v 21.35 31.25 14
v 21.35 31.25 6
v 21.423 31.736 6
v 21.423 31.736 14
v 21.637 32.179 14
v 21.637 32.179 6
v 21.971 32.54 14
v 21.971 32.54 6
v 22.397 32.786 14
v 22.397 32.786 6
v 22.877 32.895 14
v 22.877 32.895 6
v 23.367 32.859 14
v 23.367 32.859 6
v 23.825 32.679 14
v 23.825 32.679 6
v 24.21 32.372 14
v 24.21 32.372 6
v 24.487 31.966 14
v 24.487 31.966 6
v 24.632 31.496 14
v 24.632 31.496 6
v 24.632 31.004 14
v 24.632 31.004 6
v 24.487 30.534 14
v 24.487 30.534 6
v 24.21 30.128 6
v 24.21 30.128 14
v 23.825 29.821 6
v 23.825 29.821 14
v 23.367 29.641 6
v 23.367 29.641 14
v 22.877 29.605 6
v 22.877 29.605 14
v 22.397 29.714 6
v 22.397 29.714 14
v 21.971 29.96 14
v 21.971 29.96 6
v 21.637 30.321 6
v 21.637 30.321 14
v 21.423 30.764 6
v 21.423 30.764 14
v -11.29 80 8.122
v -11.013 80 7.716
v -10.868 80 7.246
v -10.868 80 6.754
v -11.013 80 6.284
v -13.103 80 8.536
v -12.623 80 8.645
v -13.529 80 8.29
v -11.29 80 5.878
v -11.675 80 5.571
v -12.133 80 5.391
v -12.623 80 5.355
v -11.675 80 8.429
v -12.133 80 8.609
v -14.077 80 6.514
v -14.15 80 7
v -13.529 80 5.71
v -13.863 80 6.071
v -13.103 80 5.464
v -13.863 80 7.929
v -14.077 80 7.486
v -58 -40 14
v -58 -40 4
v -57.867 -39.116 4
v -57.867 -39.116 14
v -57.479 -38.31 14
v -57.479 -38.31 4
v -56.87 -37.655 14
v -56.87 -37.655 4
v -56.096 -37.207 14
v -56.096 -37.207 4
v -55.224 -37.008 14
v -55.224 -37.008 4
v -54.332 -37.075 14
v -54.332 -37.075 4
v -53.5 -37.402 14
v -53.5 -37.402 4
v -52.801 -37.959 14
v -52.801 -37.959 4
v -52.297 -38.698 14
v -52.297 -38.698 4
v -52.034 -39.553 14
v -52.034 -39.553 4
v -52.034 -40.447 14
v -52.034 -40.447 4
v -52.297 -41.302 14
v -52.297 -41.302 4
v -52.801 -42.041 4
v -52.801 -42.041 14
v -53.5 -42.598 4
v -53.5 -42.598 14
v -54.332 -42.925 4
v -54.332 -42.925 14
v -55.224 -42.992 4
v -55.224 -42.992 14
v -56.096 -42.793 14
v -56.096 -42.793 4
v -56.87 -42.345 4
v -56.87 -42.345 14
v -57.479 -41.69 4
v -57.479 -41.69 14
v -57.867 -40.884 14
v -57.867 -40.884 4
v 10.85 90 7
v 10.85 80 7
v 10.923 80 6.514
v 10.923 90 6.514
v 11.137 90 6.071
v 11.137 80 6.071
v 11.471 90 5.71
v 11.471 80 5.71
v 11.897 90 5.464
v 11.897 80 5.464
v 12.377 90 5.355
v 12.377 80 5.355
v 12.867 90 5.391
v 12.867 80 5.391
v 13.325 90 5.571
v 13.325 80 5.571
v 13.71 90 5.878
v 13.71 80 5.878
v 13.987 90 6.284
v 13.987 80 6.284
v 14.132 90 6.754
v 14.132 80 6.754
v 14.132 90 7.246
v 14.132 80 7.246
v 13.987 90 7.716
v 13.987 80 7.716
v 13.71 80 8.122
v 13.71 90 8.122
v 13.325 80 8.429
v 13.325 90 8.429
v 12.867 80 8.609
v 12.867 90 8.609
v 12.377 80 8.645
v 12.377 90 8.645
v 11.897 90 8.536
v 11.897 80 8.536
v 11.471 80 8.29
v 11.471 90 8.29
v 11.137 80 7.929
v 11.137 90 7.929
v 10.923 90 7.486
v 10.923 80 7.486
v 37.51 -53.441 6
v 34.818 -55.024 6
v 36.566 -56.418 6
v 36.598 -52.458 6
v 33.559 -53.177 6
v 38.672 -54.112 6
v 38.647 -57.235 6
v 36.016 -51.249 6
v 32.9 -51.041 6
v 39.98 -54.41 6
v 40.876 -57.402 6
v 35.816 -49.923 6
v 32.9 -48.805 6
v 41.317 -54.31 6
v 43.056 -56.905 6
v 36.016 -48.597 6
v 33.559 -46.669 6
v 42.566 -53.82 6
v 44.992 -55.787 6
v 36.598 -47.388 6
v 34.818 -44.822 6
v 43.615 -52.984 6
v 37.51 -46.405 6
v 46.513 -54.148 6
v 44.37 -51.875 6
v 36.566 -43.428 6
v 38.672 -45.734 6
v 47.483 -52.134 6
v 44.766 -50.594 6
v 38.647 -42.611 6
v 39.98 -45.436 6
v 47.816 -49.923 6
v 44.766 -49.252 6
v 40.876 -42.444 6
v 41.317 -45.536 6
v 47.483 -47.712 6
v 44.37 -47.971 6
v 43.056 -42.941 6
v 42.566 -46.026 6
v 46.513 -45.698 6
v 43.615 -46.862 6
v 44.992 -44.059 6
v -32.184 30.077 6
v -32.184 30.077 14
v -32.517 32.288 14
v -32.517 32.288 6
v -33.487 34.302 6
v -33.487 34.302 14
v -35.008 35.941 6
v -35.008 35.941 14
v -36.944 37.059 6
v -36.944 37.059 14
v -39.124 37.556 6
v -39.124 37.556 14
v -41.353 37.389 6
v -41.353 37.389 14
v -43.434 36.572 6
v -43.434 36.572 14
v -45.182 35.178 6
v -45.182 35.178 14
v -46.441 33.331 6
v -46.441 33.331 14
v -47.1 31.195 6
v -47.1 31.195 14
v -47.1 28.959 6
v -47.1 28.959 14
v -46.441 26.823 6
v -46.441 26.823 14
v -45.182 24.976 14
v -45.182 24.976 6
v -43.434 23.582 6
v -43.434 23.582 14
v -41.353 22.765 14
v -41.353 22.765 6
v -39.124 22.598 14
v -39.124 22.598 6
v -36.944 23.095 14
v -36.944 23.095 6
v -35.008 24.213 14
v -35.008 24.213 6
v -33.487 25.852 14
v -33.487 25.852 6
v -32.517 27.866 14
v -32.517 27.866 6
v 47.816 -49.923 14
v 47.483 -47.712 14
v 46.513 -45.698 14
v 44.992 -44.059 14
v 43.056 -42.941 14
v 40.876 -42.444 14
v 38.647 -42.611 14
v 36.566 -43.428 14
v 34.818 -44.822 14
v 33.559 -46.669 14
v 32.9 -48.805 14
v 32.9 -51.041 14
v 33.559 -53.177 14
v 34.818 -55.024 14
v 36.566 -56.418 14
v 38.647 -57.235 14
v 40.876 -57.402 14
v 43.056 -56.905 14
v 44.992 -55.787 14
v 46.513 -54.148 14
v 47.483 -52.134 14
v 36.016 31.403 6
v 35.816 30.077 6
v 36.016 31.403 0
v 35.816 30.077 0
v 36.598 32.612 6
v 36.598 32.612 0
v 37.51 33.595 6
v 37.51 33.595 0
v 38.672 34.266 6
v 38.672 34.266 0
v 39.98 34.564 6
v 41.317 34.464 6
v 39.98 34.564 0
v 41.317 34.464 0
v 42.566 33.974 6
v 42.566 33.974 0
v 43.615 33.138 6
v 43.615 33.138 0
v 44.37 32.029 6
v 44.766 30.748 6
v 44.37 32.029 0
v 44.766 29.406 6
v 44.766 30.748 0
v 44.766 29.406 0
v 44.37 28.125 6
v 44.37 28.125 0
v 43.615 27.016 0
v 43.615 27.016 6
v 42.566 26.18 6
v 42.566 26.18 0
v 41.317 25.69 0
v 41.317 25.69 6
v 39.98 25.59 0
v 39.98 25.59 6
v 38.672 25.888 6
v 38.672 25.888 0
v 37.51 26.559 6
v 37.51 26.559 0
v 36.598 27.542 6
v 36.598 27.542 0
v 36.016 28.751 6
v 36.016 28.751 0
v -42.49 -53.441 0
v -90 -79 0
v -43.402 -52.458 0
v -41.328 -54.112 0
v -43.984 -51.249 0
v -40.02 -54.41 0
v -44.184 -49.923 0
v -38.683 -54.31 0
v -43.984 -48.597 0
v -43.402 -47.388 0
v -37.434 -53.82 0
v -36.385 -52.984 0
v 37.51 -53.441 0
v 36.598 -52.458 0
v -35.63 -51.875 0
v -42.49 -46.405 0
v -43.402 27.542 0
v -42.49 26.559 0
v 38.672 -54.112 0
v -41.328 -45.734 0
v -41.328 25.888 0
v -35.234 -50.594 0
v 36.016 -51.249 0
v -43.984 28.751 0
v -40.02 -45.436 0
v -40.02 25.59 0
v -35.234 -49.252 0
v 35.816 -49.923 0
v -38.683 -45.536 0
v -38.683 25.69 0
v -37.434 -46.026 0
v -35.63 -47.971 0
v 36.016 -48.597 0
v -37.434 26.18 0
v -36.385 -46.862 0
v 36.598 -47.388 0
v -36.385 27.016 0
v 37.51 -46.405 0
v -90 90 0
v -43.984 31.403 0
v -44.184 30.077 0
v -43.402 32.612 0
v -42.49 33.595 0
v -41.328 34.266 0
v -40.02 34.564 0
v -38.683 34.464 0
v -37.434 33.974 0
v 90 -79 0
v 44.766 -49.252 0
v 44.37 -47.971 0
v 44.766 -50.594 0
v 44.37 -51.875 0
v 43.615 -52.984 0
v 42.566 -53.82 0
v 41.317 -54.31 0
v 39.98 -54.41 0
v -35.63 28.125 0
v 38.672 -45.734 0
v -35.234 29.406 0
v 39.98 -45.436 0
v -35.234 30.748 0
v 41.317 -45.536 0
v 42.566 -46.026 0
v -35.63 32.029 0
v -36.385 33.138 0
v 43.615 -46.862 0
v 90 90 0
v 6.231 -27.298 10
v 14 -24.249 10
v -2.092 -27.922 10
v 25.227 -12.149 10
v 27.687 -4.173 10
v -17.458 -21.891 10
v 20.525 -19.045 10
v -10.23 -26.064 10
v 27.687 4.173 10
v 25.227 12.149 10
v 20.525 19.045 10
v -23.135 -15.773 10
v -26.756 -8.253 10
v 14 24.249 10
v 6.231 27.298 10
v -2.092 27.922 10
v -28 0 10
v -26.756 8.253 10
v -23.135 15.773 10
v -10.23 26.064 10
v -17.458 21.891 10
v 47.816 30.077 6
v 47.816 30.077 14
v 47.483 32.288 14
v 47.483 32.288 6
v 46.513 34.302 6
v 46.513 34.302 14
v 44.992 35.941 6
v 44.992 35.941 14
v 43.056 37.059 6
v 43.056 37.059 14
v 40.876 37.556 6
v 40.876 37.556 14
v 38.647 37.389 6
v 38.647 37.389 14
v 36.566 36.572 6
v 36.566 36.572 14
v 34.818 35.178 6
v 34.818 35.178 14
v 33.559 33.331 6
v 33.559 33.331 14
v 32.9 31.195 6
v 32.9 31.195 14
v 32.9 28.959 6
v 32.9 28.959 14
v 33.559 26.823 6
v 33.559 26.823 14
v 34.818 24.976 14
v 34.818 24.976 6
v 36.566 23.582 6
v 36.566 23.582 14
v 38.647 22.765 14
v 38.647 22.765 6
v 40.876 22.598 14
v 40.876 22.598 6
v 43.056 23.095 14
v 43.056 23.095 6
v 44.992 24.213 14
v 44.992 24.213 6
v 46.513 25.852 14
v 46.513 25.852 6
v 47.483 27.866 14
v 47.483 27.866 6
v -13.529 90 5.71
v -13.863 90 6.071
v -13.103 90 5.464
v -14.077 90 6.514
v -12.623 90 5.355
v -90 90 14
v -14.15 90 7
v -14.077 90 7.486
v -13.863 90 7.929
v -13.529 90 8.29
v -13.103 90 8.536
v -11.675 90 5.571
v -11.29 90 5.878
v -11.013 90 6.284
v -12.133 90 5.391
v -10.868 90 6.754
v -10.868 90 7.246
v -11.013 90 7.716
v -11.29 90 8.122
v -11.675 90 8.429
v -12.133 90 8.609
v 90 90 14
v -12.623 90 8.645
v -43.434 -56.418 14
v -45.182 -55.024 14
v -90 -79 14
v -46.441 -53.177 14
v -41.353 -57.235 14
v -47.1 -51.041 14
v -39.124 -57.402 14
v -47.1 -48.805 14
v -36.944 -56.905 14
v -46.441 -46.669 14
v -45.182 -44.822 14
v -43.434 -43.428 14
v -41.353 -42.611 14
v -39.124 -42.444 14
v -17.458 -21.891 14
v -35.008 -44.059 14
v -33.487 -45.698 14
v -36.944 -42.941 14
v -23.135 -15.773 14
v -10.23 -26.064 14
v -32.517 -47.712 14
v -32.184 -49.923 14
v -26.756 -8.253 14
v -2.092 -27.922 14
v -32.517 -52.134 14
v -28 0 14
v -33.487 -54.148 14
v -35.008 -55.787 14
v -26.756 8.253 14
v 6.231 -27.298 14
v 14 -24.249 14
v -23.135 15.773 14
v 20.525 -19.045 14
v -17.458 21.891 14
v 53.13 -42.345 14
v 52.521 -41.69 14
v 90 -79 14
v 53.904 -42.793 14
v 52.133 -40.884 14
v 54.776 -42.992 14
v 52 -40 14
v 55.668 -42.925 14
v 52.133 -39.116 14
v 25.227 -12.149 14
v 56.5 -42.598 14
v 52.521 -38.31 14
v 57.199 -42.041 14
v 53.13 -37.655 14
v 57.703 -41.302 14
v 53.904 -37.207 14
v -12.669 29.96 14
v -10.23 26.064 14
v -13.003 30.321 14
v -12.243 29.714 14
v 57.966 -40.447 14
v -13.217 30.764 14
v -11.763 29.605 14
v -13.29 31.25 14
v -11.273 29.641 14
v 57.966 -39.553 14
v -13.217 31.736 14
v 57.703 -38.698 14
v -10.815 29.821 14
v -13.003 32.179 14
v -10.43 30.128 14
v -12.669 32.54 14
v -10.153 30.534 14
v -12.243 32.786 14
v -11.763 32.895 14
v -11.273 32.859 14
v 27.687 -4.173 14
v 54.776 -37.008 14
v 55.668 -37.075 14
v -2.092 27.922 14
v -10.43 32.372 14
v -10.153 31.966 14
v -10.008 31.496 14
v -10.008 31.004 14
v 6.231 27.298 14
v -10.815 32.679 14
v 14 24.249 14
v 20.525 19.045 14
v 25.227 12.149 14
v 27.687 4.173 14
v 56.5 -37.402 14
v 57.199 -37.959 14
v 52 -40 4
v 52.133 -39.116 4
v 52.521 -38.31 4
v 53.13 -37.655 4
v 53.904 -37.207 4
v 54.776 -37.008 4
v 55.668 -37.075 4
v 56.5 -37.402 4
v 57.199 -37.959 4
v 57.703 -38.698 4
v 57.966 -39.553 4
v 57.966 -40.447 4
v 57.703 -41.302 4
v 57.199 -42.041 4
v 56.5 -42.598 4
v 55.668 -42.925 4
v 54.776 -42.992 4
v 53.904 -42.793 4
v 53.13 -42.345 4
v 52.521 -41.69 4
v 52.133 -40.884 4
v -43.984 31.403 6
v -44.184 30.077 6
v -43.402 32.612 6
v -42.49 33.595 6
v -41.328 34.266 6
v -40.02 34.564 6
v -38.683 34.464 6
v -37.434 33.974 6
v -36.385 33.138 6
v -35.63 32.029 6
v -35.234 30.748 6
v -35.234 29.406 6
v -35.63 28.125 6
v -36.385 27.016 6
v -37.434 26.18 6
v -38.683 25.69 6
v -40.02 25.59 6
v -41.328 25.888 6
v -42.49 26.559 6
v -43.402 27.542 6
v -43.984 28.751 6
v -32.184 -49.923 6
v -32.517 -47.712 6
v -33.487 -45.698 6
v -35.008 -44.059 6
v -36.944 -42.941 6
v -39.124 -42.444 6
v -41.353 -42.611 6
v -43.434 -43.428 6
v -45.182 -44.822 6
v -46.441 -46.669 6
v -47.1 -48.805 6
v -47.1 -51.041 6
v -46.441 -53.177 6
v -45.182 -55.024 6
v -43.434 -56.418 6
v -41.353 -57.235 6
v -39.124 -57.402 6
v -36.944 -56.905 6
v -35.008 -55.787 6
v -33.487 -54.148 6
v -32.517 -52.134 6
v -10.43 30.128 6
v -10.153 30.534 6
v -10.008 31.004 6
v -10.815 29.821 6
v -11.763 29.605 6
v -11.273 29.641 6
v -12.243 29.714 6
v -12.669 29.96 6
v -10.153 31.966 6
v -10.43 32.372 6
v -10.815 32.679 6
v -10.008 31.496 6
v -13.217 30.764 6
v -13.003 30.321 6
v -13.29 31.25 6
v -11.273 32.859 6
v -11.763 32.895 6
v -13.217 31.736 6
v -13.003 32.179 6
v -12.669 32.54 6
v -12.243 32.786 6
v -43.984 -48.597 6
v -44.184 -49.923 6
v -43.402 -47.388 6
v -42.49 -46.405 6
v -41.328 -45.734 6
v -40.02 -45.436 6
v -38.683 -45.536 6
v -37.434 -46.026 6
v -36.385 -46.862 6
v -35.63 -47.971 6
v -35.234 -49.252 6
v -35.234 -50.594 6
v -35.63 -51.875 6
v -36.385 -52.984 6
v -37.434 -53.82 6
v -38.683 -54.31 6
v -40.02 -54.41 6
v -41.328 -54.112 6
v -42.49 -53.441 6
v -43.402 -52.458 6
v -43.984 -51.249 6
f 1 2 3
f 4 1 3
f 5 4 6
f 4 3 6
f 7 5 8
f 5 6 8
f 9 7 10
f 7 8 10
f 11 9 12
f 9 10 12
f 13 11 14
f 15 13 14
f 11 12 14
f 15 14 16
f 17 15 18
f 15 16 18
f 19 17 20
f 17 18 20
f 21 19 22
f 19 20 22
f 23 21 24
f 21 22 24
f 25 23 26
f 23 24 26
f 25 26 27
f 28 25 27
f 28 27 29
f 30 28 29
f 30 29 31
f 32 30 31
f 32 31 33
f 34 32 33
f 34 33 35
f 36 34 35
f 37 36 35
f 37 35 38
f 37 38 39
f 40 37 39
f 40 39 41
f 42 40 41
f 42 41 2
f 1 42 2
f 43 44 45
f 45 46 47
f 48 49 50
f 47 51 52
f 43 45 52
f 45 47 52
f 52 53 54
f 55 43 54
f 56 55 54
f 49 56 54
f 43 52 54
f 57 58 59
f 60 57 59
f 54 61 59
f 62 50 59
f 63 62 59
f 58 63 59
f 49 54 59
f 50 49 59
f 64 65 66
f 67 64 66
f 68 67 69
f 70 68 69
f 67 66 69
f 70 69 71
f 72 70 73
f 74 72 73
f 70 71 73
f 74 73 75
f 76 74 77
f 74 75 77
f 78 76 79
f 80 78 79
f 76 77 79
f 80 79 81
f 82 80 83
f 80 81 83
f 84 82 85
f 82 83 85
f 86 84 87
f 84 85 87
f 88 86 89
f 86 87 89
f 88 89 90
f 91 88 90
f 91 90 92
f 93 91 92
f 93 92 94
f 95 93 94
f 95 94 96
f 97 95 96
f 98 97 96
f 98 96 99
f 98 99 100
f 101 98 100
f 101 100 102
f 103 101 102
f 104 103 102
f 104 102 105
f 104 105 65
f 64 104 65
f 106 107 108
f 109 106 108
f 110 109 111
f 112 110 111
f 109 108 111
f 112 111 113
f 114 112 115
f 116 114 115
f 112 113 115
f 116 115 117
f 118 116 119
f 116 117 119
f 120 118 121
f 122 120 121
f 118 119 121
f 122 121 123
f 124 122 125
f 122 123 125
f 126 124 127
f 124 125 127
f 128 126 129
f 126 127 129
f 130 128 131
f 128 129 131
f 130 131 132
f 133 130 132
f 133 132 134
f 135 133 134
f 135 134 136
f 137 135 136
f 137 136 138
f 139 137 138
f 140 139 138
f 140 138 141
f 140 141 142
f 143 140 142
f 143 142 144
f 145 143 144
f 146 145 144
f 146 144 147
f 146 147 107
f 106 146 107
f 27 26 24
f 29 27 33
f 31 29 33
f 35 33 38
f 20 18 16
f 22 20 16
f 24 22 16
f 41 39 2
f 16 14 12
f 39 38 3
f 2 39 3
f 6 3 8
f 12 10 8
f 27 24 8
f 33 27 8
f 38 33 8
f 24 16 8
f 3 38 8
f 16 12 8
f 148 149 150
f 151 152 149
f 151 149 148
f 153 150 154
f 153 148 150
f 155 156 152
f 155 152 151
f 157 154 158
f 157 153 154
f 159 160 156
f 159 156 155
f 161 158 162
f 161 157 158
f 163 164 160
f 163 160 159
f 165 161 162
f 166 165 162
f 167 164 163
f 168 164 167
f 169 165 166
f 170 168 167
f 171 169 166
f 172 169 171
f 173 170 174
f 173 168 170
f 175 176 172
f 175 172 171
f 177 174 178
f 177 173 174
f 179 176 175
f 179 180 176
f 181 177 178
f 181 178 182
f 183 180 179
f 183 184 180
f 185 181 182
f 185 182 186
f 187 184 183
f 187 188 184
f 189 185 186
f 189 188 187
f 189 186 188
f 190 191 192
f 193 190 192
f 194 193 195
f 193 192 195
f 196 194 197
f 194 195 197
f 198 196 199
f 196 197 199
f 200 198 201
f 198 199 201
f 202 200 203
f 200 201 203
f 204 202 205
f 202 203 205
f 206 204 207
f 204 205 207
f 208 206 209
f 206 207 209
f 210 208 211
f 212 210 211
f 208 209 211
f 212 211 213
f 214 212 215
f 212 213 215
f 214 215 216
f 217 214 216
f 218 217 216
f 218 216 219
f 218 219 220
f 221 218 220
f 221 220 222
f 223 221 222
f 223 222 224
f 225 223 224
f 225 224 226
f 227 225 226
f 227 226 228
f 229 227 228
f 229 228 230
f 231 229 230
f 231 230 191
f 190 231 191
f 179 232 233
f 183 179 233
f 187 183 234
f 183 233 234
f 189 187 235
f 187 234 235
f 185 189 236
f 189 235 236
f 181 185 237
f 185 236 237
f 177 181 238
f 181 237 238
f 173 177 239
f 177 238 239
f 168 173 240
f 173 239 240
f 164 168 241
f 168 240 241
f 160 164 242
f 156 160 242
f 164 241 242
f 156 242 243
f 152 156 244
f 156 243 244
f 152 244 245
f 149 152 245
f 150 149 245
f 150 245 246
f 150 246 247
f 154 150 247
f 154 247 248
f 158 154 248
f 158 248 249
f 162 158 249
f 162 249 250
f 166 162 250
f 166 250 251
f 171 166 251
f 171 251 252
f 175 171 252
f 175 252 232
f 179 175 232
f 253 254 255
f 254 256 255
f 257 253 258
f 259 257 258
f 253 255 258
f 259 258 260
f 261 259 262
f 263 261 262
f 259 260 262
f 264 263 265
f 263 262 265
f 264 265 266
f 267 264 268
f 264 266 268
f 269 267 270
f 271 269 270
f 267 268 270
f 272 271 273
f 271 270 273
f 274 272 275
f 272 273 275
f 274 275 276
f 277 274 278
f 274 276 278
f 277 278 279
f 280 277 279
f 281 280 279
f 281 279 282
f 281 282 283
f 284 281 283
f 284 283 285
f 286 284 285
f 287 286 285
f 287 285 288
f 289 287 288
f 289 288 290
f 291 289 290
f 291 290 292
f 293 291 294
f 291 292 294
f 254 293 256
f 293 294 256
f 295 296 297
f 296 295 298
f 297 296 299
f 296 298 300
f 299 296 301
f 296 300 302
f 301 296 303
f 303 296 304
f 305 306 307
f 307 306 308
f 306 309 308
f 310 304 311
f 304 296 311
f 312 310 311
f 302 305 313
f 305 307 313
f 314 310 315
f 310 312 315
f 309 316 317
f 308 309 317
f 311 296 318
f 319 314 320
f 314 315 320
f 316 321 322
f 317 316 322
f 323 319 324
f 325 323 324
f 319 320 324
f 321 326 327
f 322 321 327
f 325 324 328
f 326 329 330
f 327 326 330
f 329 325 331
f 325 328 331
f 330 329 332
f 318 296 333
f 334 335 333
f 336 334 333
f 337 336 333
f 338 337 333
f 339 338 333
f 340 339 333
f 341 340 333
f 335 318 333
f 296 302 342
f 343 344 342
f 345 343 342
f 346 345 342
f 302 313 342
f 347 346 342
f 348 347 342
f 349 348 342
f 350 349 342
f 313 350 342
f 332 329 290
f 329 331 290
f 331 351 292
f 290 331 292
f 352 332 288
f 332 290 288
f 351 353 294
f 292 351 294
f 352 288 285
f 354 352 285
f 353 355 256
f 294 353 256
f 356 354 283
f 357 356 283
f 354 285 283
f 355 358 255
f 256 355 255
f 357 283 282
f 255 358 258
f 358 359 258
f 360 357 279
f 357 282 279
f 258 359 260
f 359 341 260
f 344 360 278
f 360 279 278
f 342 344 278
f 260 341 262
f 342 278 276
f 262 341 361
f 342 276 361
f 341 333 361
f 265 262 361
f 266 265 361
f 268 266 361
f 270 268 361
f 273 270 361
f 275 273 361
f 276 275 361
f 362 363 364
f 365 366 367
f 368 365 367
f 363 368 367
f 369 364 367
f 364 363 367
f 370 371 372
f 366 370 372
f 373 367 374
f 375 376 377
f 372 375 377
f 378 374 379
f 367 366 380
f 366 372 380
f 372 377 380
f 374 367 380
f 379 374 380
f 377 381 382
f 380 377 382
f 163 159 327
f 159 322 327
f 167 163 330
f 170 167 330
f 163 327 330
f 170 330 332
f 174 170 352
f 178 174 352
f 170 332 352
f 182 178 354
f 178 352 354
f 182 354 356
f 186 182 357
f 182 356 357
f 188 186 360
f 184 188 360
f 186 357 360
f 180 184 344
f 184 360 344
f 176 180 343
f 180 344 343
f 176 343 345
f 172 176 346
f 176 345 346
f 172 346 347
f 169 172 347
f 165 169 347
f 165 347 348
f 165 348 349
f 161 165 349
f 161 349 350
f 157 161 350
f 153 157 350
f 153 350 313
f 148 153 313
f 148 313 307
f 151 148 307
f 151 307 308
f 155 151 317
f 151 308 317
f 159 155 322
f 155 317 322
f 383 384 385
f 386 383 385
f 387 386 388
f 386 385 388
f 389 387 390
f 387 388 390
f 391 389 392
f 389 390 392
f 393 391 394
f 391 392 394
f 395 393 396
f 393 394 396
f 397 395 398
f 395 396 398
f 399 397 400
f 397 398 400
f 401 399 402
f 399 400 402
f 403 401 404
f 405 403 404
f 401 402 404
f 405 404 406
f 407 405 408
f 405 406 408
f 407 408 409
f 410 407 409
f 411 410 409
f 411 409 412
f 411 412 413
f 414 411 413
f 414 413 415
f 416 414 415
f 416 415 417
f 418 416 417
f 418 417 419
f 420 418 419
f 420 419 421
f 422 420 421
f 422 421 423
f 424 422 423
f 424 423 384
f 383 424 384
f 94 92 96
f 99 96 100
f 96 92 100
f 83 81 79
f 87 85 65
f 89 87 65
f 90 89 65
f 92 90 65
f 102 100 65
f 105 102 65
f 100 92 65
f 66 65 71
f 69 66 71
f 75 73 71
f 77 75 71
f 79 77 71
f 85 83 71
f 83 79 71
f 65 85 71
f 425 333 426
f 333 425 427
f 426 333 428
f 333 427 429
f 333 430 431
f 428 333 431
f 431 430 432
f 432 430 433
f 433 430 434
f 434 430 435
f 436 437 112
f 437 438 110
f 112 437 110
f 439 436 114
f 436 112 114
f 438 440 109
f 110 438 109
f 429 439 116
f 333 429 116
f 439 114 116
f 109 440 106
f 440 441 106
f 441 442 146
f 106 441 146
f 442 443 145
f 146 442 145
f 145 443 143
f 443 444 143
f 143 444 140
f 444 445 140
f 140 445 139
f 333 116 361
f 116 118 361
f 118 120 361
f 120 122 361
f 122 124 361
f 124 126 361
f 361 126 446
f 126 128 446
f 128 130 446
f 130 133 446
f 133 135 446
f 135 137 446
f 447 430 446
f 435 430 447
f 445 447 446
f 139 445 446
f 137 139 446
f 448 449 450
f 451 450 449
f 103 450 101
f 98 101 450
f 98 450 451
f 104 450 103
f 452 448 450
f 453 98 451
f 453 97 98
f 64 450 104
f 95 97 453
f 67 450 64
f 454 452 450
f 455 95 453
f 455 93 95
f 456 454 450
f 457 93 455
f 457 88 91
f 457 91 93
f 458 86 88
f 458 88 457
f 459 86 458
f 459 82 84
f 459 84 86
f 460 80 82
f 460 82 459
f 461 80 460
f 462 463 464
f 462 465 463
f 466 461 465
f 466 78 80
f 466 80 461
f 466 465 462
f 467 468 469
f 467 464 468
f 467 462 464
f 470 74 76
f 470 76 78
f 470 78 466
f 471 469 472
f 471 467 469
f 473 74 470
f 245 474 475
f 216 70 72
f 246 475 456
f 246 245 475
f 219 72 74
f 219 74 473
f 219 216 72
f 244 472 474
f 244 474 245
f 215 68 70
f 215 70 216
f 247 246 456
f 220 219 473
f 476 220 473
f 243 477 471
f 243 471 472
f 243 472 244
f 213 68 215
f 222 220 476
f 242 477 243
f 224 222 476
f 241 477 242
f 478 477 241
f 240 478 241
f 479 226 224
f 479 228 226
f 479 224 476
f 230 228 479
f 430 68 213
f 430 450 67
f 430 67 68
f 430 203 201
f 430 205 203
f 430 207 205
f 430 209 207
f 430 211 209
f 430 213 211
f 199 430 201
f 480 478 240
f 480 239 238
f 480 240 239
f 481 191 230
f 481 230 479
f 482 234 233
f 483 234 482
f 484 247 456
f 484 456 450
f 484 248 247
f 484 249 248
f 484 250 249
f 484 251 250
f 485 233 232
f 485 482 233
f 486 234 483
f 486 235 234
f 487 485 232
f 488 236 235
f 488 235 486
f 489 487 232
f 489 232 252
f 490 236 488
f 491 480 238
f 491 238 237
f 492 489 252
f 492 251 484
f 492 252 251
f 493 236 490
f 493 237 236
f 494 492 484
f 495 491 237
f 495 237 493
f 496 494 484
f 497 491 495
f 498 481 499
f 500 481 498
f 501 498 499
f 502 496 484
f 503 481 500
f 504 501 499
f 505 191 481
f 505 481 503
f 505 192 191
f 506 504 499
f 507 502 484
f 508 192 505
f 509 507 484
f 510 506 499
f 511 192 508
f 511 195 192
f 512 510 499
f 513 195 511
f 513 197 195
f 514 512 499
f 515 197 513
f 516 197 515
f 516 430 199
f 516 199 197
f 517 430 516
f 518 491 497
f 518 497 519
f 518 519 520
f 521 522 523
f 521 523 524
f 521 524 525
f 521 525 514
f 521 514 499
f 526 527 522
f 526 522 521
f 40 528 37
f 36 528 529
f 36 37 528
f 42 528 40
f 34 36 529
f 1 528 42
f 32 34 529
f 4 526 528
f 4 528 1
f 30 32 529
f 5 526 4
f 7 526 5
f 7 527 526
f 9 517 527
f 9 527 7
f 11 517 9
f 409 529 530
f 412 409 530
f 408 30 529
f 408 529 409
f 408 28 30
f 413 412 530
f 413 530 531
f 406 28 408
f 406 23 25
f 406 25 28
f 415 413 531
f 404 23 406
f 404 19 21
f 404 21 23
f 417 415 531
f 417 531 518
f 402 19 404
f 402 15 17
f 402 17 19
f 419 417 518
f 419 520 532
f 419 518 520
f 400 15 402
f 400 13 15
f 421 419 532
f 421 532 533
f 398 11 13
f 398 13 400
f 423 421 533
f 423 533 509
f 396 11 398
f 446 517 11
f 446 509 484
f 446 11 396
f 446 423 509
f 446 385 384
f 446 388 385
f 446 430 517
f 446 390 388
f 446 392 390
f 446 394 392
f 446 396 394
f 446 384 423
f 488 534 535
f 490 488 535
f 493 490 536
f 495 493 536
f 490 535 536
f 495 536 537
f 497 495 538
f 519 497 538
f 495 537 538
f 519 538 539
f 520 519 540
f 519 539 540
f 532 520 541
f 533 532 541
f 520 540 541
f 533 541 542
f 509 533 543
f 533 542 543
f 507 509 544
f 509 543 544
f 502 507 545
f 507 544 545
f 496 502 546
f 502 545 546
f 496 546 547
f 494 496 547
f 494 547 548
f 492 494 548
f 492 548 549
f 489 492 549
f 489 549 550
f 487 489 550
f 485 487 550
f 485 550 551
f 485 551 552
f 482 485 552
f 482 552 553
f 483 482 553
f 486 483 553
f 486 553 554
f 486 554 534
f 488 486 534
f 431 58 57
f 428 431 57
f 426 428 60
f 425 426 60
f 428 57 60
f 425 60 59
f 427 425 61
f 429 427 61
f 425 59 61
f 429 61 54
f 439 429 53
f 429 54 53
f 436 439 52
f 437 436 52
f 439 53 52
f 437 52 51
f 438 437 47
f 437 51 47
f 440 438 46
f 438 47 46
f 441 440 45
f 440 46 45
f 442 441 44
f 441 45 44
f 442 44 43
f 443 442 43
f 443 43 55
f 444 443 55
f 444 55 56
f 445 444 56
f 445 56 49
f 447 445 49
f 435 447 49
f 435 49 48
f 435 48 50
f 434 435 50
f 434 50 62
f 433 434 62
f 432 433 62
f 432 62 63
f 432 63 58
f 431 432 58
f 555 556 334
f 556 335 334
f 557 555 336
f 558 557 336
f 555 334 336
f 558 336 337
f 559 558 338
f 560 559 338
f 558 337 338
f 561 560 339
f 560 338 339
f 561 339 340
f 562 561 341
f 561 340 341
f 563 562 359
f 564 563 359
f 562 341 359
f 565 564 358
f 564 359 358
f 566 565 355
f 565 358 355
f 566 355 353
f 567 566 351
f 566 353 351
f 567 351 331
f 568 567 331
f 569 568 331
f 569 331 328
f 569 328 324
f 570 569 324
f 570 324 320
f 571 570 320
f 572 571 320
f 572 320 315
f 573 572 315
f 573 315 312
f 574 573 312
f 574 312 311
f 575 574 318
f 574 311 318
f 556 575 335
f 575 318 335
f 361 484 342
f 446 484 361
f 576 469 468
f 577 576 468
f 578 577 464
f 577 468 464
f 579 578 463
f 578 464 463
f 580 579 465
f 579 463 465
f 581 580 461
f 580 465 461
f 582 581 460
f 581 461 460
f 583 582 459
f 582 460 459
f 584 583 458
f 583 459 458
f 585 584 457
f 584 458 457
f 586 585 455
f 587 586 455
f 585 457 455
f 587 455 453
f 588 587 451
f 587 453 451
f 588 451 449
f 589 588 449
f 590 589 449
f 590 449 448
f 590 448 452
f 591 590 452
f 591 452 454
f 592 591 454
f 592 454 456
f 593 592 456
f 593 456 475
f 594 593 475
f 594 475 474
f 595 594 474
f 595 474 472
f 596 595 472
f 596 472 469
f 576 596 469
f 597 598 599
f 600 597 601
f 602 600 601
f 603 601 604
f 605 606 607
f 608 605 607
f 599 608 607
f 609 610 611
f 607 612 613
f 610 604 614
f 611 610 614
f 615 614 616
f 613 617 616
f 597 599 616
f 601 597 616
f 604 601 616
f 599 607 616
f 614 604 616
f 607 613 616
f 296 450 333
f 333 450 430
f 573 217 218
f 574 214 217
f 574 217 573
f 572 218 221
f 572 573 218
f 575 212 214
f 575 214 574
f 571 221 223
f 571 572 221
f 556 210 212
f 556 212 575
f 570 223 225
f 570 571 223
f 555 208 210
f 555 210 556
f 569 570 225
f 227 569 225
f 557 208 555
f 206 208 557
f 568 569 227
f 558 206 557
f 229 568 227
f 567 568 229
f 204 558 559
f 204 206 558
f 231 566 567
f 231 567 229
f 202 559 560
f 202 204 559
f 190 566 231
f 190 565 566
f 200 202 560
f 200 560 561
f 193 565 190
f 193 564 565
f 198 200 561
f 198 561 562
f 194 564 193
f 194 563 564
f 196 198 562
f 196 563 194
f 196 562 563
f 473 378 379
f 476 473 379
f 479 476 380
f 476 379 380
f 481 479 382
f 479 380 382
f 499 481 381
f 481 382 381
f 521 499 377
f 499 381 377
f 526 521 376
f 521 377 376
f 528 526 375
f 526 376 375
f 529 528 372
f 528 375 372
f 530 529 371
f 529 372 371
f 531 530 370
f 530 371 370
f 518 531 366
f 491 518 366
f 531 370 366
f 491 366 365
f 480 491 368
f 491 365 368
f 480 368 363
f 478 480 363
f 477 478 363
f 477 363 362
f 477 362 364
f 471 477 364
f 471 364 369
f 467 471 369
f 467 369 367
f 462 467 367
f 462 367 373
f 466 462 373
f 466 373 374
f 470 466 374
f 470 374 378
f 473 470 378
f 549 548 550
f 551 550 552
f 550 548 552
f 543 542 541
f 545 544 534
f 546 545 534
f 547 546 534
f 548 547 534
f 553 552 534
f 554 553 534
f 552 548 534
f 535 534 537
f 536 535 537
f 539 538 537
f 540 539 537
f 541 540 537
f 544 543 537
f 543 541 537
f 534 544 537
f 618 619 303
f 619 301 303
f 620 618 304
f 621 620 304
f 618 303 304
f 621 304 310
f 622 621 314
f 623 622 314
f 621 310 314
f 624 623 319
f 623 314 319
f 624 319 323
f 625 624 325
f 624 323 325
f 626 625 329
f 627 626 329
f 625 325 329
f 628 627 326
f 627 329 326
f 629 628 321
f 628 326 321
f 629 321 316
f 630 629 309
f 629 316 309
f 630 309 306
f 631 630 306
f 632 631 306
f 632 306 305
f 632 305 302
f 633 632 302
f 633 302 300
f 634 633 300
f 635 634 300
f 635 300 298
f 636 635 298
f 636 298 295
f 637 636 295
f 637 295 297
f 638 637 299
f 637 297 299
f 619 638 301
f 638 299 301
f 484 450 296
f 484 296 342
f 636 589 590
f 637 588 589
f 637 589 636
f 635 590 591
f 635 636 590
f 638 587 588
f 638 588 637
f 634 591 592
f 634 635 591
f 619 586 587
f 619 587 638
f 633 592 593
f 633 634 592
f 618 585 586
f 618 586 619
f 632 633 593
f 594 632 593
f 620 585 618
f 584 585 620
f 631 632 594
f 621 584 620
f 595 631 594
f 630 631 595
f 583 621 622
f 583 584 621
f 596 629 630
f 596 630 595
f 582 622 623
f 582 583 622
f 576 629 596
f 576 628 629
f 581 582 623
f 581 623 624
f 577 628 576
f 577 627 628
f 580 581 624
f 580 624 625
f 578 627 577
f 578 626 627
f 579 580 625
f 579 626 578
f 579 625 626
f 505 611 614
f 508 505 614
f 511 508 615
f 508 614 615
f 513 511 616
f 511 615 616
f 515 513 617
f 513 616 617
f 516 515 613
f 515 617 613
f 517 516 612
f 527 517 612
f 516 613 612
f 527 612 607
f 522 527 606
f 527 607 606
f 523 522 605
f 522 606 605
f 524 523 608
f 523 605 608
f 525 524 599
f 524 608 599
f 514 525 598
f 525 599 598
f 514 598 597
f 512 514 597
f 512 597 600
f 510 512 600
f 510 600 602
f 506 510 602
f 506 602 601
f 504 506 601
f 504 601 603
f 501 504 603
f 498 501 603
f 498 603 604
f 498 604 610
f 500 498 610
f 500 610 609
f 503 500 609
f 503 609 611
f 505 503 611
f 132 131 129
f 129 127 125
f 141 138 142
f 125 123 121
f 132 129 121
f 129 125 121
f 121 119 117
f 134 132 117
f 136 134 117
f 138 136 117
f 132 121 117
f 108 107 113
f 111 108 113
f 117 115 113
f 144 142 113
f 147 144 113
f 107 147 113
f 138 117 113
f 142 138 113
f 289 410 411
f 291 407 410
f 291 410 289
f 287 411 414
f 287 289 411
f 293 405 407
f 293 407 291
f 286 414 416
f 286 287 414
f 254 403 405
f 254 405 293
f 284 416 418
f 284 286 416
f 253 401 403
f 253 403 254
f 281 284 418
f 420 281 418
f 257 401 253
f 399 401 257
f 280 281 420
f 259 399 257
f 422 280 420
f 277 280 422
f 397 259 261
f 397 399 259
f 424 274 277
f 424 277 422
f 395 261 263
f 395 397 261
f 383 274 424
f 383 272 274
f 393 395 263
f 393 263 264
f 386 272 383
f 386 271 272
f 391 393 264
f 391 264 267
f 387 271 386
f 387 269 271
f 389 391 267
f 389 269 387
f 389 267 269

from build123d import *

# Parameters (mm, degrees)
SKETCH1_W                               = 180
SKETCH1_H                               = 169
BOSS_EXTRUDE1_DEPTH                     = 14
F_6_0_6_DIAMETER_HOLE1_D                = 6
F_6_0_6_DIAMETER_HOLE1_DEPTH            = 10
M48_CLEARANCE_HOLE1_D                   = 56
M48_CLEARANCE_HOLE1_DEPTH               = 4
F_3_3_3_3_DIAMETER_HOLE1_D              = 3.3
F_3_3_3_3_DIAMETER_HOLE1_DEPTH          = 8
CBORE_FOR_M8_HEX_HEAD_BOLT1_D           = 9
CBORE_FOR_M8_HEX_HEAD_BOLT1_CBORE_D     = 15
CBORE_FOR_M8_HEX_HEAD_BOLT1_CBORE_DEPTH = 8
F_3_3_3_3_DIAMETER_HOLE2_D              = 3.3
F_3_3_3_3_DIAMETER_HOLE2_DEPTH          = 10


with BuildPart() as part:
    # Sketch1 → Boss-Extrude1 (new body)
    with BuildSketch(Plane.XY.offset(14)):
        with Locations((0, 5.5)):
            Rectangle(SKETCH1_W, SKETCH1_H)
    extrude(amount=-BOSS_EXTRUDE1_DEPTH)

    # Ø6.0 (6) Diameter Hole1
    with Locations(Plane.XY.offset(14)):
        with Locations((55, -40), (-55, -40)):
            Hole(F_6_0_6_DIAMETER_HOLE1_D / 2, depth=F_6_0_6_DIAMETER_HOLE1_DEPTH)

    # M48 Clearance Hole1
    with Locations(Plane.XY.offset(14)):
        with Locations((0, 0)):
            Hole(M48_CLEARANCE_HOLE1_D / 2, depth=M48_CLEARANCE_HOLE1_DEPTH)

    # Ø3.3 (3.3) Diameter Hole1
    with Locations(Plane.XY.offset(14)):
        with Locations((23, 31.25), (-11.64, 31.25)):
            Hole(F_3_3_3_3_DIAMETER_HOLE1_D / 2, depth=F_3_3_3_3_DIAMETER_HOLE1_DEPTH)

    # CBORE for M8 Hex Head Bolt1 (through all)
    with Locations(Plane.XY.offset(14)):
        with Locations((40.316, 30.077), (-39.684, 30.077), (40.316, -49.923), (-39.684, -49.923)):
            CounterBoreHole(CBORE_FOR_M8_HEX_HEAD_BOLT1_D / 2, CBORE_FOR_M8_HEX_HEAD_BOLT1_CBORE_D / 2, CBORE_FOR_M8_HEX_HEAD_BOLT1_CBORE_DEPTH)

    # Ø3.3 (3.3) Diameter Hole2
    with Locations(Plane(origin=(0, 90, 0), x_dir=(1, 0, 0), z_dir=(0, 1, 0))):
        with Locations((-12.5, -7), (12.5, -7)):
            Hole(F_3_3_3_3_DIAMETER_HOLE2_D / 2, depth=F_3_3_3_3_DIAMETER_HOLE2_DEPTH)


solid = part.part
